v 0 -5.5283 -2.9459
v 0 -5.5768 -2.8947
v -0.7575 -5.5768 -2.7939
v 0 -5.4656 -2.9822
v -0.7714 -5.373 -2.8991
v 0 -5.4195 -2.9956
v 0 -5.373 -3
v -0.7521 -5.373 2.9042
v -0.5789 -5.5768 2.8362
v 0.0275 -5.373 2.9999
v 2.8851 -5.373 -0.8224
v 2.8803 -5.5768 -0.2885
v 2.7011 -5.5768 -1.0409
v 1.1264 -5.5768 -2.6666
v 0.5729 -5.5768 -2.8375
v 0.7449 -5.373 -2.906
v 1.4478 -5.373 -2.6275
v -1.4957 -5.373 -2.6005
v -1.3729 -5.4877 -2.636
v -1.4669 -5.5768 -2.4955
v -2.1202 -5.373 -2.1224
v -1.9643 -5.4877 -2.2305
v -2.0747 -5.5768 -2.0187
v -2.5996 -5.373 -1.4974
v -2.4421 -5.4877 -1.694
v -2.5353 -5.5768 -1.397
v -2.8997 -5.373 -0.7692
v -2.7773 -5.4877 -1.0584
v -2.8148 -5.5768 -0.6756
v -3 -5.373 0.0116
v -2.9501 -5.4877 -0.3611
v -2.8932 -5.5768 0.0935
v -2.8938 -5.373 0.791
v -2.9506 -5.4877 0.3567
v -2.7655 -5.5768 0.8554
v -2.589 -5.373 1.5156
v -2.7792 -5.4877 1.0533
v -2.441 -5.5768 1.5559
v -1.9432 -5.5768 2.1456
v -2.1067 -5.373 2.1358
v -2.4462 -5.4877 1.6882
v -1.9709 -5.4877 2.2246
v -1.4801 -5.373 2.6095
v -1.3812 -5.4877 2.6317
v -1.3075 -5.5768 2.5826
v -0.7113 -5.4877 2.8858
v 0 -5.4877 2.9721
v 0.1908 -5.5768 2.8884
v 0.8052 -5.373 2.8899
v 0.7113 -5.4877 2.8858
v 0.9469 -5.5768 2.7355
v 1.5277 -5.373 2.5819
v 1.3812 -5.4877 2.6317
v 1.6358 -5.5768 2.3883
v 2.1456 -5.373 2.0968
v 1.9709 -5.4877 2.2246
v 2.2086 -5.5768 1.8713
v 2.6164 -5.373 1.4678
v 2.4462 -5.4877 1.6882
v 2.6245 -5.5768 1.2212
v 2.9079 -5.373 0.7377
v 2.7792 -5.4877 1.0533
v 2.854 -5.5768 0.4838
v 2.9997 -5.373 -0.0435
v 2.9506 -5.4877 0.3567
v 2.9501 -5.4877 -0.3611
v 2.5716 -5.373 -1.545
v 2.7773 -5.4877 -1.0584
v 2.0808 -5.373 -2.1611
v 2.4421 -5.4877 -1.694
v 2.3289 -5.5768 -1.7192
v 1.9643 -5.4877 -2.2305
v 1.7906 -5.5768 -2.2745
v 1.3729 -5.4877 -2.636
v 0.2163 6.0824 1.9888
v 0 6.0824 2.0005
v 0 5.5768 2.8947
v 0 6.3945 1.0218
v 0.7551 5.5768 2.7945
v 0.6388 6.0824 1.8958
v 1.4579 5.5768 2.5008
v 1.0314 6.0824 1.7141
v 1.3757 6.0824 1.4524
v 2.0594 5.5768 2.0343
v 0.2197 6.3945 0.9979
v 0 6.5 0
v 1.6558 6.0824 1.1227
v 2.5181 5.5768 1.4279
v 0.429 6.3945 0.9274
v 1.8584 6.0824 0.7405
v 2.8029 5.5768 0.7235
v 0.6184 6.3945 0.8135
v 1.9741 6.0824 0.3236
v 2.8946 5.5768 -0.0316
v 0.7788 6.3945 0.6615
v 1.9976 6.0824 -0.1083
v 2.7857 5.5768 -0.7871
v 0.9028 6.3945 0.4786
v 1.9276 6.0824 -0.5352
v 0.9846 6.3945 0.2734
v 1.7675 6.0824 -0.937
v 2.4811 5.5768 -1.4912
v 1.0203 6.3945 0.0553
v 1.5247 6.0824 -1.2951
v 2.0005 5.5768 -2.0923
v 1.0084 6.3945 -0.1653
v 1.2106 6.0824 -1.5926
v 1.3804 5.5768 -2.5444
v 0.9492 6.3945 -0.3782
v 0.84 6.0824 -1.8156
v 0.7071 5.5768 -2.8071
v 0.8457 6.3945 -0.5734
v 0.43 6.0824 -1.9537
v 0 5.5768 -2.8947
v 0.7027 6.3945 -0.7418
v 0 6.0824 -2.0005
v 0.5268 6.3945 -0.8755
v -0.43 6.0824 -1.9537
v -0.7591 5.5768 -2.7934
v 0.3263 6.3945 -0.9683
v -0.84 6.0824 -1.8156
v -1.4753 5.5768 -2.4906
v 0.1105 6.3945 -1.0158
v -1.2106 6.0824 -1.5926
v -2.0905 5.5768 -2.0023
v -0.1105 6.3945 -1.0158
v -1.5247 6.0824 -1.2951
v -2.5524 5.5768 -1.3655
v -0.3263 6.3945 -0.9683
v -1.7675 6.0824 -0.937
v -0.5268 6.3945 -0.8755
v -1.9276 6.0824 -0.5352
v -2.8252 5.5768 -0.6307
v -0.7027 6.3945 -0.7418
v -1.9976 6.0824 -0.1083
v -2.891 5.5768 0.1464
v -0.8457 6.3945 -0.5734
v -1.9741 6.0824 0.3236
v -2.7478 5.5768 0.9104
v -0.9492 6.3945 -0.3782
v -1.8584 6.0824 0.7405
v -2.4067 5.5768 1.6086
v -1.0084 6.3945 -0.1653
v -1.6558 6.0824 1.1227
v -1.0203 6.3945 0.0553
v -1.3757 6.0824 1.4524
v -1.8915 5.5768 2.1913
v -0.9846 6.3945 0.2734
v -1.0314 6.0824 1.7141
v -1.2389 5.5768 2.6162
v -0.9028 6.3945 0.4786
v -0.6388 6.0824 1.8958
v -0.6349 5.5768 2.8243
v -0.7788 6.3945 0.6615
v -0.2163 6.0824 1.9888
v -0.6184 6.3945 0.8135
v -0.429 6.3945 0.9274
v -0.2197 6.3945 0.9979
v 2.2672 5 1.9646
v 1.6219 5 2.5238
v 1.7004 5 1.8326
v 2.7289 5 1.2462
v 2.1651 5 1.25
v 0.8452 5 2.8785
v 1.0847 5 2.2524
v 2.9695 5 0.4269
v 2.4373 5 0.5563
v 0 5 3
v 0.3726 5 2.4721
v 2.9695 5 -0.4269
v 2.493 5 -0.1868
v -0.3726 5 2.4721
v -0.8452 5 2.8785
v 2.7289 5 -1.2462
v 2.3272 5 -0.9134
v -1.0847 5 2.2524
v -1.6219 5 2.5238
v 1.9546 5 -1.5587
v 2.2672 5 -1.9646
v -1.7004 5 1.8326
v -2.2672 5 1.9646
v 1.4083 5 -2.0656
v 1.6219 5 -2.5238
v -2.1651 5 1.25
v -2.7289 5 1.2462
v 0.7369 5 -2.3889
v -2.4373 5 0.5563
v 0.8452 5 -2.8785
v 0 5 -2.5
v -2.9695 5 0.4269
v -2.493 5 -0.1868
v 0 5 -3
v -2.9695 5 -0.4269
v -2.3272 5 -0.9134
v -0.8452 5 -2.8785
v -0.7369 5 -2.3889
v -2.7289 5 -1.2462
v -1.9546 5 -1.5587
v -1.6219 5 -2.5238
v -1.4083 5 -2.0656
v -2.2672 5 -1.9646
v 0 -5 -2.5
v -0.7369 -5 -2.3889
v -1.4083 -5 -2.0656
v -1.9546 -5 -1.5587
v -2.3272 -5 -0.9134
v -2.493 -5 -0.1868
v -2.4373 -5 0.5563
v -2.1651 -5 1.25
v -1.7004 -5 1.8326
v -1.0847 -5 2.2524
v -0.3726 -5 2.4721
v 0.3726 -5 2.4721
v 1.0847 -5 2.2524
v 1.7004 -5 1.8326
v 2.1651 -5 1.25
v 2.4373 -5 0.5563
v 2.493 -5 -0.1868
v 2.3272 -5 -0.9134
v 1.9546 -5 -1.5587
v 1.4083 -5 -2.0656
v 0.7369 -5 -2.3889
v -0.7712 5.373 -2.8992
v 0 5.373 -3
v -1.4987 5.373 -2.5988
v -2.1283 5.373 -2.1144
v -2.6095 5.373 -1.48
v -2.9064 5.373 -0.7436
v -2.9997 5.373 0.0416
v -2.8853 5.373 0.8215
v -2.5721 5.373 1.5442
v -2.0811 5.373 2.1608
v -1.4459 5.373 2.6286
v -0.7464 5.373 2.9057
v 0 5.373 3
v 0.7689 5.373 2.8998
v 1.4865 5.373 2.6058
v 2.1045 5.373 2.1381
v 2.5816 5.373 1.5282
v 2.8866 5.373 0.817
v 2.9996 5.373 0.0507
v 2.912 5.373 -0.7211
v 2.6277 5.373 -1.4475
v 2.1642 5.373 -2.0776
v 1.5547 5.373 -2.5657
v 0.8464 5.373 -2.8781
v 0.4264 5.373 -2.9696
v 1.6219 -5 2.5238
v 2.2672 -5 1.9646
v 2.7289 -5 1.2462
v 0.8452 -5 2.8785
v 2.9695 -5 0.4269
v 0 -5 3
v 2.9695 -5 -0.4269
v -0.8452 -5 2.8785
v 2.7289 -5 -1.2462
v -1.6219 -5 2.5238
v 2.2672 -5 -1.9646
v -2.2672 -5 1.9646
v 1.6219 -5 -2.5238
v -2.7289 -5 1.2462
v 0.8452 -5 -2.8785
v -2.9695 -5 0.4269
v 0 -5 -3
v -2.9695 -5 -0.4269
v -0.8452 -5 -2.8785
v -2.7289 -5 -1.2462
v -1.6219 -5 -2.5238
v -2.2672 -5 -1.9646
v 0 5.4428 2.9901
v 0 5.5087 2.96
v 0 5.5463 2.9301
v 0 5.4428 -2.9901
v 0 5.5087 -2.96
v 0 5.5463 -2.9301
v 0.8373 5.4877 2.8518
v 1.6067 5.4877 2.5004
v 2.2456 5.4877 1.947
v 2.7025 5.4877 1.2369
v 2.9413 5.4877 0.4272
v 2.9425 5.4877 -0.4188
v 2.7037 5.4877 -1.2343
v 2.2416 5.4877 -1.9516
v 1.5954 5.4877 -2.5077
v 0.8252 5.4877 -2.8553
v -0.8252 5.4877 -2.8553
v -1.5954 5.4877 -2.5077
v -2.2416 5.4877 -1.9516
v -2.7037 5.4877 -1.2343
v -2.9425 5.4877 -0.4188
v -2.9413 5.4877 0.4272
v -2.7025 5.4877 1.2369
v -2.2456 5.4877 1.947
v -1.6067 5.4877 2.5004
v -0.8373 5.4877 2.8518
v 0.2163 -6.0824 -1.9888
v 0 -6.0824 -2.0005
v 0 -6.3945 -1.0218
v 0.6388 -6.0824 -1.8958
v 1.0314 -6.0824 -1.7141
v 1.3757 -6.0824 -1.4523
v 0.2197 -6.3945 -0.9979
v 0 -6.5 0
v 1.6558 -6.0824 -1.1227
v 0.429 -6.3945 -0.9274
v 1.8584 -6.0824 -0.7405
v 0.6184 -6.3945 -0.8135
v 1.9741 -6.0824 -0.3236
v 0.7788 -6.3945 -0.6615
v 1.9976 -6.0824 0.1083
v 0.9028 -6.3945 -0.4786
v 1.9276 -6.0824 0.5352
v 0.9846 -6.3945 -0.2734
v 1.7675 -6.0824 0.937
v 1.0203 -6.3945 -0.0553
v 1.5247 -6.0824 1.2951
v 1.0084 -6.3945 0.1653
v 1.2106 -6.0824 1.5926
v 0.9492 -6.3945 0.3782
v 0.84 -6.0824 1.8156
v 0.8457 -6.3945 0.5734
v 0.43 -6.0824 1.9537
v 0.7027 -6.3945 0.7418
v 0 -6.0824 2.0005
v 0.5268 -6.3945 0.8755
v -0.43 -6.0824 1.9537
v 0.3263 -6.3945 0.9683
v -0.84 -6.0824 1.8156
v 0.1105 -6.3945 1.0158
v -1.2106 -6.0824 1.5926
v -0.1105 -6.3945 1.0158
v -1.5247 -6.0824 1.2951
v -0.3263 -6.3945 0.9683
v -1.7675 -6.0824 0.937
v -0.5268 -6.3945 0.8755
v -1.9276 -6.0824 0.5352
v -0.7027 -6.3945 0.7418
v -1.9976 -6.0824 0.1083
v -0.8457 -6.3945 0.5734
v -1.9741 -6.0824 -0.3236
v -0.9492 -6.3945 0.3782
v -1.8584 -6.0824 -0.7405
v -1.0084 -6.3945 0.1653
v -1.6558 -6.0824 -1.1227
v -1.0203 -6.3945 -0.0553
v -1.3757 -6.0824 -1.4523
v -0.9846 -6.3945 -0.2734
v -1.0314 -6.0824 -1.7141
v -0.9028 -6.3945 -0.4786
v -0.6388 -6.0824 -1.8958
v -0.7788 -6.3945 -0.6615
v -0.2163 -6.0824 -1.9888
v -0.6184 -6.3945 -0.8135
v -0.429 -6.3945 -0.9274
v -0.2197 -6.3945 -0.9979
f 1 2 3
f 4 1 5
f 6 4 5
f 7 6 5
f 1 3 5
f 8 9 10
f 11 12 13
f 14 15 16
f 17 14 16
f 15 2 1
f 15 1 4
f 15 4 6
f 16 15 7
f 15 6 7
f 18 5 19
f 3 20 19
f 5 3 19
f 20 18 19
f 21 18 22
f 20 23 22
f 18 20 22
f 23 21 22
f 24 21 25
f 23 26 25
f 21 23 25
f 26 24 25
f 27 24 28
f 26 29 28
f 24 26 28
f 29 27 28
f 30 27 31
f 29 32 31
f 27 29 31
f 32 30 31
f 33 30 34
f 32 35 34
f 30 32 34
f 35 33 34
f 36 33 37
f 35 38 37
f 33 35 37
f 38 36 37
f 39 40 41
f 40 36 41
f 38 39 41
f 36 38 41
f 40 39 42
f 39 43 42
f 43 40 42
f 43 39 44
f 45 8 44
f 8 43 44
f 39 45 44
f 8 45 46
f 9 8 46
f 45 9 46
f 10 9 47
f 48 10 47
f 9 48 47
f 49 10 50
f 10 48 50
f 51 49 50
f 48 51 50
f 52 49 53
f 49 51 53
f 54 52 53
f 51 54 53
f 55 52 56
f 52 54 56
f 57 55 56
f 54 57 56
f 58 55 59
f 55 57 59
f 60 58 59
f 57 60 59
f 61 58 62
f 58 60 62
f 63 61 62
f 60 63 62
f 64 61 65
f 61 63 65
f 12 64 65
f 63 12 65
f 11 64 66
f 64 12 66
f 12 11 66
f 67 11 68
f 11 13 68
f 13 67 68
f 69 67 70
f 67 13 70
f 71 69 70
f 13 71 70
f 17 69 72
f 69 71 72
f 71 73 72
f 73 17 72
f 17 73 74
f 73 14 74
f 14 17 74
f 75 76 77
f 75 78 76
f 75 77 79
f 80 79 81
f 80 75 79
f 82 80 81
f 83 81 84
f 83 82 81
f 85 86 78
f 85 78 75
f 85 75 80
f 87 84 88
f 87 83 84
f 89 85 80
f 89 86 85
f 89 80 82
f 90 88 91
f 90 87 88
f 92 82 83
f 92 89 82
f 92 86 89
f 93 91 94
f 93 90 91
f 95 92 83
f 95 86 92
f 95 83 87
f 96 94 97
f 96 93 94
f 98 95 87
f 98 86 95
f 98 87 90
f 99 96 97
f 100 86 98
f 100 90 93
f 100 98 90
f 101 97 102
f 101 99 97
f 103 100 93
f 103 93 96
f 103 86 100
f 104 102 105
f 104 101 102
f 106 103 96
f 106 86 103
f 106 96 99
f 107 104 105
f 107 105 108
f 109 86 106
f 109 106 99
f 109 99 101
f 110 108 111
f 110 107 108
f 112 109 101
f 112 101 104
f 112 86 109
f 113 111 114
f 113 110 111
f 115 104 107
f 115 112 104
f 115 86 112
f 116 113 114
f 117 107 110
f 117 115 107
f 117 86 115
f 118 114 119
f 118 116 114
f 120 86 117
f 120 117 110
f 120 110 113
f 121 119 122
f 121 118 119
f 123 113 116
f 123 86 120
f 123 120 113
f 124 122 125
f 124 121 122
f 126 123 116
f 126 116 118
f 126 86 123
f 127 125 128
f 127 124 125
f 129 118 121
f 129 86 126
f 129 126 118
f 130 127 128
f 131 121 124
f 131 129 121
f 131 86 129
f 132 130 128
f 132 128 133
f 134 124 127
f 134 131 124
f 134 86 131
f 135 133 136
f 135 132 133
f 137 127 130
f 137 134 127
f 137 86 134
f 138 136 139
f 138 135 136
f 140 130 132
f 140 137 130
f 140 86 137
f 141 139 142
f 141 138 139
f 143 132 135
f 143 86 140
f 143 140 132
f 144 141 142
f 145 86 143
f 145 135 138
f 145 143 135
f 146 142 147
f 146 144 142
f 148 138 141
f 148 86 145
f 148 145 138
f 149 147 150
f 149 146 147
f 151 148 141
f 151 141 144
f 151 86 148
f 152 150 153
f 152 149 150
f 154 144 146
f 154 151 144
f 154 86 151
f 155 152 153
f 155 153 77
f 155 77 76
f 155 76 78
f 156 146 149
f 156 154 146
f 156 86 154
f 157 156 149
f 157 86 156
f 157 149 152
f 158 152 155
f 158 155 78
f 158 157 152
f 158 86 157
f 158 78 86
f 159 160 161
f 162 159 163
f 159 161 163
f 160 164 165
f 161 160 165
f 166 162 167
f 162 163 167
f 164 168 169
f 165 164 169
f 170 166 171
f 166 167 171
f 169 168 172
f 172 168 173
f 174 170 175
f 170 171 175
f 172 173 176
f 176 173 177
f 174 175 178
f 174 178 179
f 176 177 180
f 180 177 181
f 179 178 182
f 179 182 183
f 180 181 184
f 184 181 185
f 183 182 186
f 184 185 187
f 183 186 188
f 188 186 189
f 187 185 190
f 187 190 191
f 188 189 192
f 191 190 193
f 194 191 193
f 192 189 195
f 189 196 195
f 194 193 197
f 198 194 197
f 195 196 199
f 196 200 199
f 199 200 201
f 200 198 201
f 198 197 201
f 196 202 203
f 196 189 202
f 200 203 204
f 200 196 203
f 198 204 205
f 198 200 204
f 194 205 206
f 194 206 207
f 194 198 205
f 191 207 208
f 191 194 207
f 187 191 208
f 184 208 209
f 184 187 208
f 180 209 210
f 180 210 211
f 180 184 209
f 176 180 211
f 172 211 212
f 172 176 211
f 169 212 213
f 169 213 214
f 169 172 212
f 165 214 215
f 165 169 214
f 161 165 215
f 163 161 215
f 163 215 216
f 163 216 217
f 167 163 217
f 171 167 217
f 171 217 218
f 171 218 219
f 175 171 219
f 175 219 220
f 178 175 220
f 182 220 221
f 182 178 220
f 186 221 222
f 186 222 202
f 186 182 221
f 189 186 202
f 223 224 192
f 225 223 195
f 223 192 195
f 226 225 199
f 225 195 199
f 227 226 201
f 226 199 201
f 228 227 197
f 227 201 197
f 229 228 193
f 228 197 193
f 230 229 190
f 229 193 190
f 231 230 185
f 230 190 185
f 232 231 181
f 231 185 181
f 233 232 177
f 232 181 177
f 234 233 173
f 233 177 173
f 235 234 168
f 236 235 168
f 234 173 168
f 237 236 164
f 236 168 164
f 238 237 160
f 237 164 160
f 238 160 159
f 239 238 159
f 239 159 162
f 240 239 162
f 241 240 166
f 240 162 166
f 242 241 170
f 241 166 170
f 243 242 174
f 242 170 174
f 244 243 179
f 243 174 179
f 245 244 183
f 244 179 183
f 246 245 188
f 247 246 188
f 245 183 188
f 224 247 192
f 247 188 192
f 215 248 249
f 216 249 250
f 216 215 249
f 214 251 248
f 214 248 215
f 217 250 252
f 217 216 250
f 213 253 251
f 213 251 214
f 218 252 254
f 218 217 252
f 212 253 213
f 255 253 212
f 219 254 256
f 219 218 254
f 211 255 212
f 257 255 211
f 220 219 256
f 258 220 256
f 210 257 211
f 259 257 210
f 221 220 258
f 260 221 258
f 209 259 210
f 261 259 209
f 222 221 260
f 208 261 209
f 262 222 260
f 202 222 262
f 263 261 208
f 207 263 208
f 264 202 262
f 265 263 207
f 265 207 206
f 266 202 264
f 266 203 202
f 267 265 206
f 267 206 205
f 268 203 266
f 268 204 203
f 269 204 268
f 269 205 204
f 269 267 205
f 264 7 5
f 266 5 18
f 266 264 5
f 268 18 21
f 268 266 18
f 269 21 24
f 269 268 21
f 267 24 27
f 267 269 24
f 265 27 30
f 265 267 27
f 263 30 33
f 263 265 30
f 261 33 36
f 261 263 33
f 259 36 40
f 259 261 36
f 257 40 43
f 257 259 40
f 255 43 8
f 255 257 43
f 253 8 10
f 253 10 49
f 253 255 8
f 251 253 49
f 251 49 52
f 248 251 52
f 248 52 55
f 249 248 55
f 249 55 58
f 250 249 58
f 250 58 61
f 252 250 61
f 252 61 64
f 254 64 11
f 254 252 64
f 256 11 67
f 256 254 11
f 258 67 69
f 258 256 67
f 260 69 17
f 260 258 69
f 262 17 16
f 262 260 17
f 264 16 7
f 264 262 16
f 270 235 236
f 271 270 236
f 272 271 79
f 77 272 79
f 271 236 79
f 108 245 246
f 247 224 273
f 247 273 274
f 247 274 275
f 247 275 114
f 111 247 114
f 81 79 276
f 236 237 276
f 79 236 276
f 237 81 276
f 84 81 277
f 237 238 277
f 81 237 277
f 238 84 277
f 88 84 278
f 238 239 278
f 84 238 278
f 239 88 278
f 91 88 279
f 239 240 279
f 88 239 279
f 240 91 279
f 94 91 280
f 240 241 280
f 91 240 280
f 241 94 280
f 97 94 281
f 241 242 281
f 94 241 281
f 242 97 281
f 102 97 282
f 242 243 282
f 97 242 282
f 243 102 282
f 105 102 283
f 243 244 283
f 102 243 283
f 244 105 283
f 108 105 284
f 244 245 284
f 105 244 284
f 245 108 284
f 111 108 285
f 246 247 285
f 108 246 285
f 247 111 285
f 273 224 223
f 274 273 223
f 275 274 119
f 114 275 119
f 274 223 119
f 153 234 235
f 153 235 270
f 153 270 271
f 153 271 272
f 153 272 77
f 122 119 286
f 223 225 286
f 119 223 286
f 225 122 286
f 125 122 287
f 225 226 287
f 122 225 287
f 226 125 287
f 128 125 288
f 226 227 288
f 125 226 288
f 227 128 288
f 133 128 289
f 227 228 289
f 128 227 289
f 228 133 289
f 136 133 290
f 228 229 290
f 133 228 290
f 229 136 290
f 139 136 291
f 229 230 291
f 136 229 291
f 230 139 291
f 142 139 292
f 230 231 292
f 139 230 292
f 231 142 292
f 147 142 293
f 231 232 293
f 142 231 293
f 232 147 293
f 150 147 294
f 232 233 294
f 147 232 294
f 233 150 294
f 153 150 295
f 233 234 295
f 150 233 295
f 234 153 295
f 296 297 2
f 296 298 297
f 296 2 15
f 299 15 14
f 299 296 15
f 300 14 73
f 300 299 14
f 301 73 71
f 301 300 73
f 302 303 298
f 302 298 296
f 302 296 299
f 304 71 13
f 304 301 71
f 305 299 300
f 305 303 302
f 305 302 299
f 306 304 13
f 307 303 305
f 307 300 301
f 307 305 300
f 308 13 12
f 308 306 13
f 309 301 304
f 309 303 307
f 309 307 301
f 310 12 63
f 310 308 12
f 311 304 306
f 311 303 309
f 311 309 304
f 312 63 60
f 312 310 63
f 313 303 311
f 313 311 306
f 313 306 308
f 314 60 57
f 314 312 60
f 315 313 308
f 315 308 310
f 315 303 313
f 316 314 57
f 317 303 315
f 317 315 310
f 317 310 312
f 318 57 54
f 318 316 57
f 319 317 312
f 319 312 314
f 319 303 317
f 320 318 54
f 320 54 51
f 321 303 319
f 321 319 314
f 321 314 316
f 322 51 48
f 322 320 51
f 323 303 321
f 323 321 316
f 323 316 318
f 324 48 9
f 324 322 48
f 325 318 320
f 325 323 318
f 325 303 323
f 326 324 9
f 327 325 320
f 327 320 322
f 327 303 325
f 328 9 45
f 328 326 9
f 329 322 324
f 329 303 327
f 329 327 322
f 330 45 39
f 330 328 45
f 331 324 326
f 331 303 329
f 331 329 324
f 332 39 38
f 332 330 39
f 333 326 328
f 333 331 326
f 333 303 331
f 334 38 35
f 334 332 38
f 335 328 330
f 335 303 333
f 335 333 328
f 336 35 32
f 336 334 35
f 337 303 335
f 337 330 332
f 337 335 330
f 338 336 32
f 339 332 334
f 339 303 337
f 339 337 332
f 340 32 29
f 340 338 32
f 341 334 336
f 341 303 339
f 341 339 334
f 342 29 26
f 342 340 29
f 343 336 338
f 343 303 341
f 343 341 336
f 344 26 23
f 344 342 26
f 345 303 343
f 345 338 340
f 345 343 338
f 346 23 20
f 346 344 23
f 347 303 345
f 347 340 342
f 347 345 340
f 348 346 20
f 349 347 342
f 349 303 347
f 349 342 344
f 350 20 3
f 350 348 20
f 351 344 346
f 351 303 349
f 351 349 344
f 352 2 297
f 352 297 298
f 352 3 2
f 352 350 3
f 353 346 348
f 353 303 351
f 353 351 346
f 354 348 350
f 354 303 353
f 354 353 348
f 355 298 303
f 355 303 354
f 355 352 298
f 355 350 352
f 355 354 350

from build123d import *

# Parameters (mm, degrees)
DOME1_FACE_RADIUS          = 3
DOME1_HEIGHT               = 1
MIRROR1_COPY_1_FACE_RADIUS = 3
MIRROR1_COPY_1_HEIGHT      = 1
FILLET1_R                  = 0.25


with BuildPart() as part:
    # Sketch1 → Revolve1 (revolve)
    with BuildSketch(Plane.XY, mode=Mode.PRIVATE) as revolve1_sk:
        Polygon((0, 0), (0, 5.5), (-3, 5.5), (-3, 5), (-2.5, 5), (-2.5, 0), align=None)
    revolve1 = revolve(revolve1_sk.sketch.rotate(Axis((0, 0, 0), (0, 1, 0)), 270), axis=Axis((0, 0, 0), (0, 1, 0)))

    # Dome1: a dome of height H over a round flat face of radius A is a cap of a sphere of radius (A * A + H * H) / (2 * H)
    dome1_r = (DOME1_FACE_RADIUS * DOME1_FACE_RADIUS + DOME1_HEIGHT * DOME1_HEIGHT) / (2 * DOME1_HEIGHT)
    dome1_base = Plane((0, 5.5, 0), z_dir=(0, 1, 0))
    with Locations(dome1_base.offset(DOME1_HEIGHT - dome1_r)):
        dome1_ball = Sphere(dome1_r, mode=Mode.PRIVATE)
    add(split(dome1_ball, bisect_by=dome1_base, keep=Keep.TOP, mode=Mode.PRIVATE))

    # Mirror1: Revolve1 across plane
    add(revolve1.mirror(Plane(origin=(-2.5, 0, 0), x_dir=(0, 0, 1), z_dir=(0, 1, 0))))

    # Mirror1 copy 1: a dome of height H over a round flat face of radius A is a cap of a sphere of radius (A * A + H * H) / (2 * H)
    mirror1_copy_1_r = (MIRROR1_COPY_1_FACE_RADIUS * MIRROR1_COPY_1_FACE_RADIUS + MIRROR1_COPY_1_HEIGHT * MIRROR1_COPY_1_HEIGHT) / (2 * MIRROR1_COPY_1_HEIGHT)
    mirror1_copy_1_base = Plane((0, -5.5, 0), z_dir=(0, -1, 0))
    with Locations(mirror1_copy_1_base.offset(MIRROR1_COPY_1_HEIGHT - mirror1_copy_1_r)):
        mirror1_copy_1_ball = Sphere(mirror1_copy_1_r, mode=Mode.PRIVATE)
    add(split(mirror1_copy_1_ball, bisect_by=mirror1_copy_1_base, keep=Keep.TOP, mode=Mode.PRIVATE))

    # Fillet1
    fillet1_edges = [part.edges().sort_by_distance(p)[0] for p in [
        (0, -5.5, 3),
        (3, 5.5, 0),
    ]]
    fillet(fillet1_edges, radius=FILLET1_R)


solid = part.part
